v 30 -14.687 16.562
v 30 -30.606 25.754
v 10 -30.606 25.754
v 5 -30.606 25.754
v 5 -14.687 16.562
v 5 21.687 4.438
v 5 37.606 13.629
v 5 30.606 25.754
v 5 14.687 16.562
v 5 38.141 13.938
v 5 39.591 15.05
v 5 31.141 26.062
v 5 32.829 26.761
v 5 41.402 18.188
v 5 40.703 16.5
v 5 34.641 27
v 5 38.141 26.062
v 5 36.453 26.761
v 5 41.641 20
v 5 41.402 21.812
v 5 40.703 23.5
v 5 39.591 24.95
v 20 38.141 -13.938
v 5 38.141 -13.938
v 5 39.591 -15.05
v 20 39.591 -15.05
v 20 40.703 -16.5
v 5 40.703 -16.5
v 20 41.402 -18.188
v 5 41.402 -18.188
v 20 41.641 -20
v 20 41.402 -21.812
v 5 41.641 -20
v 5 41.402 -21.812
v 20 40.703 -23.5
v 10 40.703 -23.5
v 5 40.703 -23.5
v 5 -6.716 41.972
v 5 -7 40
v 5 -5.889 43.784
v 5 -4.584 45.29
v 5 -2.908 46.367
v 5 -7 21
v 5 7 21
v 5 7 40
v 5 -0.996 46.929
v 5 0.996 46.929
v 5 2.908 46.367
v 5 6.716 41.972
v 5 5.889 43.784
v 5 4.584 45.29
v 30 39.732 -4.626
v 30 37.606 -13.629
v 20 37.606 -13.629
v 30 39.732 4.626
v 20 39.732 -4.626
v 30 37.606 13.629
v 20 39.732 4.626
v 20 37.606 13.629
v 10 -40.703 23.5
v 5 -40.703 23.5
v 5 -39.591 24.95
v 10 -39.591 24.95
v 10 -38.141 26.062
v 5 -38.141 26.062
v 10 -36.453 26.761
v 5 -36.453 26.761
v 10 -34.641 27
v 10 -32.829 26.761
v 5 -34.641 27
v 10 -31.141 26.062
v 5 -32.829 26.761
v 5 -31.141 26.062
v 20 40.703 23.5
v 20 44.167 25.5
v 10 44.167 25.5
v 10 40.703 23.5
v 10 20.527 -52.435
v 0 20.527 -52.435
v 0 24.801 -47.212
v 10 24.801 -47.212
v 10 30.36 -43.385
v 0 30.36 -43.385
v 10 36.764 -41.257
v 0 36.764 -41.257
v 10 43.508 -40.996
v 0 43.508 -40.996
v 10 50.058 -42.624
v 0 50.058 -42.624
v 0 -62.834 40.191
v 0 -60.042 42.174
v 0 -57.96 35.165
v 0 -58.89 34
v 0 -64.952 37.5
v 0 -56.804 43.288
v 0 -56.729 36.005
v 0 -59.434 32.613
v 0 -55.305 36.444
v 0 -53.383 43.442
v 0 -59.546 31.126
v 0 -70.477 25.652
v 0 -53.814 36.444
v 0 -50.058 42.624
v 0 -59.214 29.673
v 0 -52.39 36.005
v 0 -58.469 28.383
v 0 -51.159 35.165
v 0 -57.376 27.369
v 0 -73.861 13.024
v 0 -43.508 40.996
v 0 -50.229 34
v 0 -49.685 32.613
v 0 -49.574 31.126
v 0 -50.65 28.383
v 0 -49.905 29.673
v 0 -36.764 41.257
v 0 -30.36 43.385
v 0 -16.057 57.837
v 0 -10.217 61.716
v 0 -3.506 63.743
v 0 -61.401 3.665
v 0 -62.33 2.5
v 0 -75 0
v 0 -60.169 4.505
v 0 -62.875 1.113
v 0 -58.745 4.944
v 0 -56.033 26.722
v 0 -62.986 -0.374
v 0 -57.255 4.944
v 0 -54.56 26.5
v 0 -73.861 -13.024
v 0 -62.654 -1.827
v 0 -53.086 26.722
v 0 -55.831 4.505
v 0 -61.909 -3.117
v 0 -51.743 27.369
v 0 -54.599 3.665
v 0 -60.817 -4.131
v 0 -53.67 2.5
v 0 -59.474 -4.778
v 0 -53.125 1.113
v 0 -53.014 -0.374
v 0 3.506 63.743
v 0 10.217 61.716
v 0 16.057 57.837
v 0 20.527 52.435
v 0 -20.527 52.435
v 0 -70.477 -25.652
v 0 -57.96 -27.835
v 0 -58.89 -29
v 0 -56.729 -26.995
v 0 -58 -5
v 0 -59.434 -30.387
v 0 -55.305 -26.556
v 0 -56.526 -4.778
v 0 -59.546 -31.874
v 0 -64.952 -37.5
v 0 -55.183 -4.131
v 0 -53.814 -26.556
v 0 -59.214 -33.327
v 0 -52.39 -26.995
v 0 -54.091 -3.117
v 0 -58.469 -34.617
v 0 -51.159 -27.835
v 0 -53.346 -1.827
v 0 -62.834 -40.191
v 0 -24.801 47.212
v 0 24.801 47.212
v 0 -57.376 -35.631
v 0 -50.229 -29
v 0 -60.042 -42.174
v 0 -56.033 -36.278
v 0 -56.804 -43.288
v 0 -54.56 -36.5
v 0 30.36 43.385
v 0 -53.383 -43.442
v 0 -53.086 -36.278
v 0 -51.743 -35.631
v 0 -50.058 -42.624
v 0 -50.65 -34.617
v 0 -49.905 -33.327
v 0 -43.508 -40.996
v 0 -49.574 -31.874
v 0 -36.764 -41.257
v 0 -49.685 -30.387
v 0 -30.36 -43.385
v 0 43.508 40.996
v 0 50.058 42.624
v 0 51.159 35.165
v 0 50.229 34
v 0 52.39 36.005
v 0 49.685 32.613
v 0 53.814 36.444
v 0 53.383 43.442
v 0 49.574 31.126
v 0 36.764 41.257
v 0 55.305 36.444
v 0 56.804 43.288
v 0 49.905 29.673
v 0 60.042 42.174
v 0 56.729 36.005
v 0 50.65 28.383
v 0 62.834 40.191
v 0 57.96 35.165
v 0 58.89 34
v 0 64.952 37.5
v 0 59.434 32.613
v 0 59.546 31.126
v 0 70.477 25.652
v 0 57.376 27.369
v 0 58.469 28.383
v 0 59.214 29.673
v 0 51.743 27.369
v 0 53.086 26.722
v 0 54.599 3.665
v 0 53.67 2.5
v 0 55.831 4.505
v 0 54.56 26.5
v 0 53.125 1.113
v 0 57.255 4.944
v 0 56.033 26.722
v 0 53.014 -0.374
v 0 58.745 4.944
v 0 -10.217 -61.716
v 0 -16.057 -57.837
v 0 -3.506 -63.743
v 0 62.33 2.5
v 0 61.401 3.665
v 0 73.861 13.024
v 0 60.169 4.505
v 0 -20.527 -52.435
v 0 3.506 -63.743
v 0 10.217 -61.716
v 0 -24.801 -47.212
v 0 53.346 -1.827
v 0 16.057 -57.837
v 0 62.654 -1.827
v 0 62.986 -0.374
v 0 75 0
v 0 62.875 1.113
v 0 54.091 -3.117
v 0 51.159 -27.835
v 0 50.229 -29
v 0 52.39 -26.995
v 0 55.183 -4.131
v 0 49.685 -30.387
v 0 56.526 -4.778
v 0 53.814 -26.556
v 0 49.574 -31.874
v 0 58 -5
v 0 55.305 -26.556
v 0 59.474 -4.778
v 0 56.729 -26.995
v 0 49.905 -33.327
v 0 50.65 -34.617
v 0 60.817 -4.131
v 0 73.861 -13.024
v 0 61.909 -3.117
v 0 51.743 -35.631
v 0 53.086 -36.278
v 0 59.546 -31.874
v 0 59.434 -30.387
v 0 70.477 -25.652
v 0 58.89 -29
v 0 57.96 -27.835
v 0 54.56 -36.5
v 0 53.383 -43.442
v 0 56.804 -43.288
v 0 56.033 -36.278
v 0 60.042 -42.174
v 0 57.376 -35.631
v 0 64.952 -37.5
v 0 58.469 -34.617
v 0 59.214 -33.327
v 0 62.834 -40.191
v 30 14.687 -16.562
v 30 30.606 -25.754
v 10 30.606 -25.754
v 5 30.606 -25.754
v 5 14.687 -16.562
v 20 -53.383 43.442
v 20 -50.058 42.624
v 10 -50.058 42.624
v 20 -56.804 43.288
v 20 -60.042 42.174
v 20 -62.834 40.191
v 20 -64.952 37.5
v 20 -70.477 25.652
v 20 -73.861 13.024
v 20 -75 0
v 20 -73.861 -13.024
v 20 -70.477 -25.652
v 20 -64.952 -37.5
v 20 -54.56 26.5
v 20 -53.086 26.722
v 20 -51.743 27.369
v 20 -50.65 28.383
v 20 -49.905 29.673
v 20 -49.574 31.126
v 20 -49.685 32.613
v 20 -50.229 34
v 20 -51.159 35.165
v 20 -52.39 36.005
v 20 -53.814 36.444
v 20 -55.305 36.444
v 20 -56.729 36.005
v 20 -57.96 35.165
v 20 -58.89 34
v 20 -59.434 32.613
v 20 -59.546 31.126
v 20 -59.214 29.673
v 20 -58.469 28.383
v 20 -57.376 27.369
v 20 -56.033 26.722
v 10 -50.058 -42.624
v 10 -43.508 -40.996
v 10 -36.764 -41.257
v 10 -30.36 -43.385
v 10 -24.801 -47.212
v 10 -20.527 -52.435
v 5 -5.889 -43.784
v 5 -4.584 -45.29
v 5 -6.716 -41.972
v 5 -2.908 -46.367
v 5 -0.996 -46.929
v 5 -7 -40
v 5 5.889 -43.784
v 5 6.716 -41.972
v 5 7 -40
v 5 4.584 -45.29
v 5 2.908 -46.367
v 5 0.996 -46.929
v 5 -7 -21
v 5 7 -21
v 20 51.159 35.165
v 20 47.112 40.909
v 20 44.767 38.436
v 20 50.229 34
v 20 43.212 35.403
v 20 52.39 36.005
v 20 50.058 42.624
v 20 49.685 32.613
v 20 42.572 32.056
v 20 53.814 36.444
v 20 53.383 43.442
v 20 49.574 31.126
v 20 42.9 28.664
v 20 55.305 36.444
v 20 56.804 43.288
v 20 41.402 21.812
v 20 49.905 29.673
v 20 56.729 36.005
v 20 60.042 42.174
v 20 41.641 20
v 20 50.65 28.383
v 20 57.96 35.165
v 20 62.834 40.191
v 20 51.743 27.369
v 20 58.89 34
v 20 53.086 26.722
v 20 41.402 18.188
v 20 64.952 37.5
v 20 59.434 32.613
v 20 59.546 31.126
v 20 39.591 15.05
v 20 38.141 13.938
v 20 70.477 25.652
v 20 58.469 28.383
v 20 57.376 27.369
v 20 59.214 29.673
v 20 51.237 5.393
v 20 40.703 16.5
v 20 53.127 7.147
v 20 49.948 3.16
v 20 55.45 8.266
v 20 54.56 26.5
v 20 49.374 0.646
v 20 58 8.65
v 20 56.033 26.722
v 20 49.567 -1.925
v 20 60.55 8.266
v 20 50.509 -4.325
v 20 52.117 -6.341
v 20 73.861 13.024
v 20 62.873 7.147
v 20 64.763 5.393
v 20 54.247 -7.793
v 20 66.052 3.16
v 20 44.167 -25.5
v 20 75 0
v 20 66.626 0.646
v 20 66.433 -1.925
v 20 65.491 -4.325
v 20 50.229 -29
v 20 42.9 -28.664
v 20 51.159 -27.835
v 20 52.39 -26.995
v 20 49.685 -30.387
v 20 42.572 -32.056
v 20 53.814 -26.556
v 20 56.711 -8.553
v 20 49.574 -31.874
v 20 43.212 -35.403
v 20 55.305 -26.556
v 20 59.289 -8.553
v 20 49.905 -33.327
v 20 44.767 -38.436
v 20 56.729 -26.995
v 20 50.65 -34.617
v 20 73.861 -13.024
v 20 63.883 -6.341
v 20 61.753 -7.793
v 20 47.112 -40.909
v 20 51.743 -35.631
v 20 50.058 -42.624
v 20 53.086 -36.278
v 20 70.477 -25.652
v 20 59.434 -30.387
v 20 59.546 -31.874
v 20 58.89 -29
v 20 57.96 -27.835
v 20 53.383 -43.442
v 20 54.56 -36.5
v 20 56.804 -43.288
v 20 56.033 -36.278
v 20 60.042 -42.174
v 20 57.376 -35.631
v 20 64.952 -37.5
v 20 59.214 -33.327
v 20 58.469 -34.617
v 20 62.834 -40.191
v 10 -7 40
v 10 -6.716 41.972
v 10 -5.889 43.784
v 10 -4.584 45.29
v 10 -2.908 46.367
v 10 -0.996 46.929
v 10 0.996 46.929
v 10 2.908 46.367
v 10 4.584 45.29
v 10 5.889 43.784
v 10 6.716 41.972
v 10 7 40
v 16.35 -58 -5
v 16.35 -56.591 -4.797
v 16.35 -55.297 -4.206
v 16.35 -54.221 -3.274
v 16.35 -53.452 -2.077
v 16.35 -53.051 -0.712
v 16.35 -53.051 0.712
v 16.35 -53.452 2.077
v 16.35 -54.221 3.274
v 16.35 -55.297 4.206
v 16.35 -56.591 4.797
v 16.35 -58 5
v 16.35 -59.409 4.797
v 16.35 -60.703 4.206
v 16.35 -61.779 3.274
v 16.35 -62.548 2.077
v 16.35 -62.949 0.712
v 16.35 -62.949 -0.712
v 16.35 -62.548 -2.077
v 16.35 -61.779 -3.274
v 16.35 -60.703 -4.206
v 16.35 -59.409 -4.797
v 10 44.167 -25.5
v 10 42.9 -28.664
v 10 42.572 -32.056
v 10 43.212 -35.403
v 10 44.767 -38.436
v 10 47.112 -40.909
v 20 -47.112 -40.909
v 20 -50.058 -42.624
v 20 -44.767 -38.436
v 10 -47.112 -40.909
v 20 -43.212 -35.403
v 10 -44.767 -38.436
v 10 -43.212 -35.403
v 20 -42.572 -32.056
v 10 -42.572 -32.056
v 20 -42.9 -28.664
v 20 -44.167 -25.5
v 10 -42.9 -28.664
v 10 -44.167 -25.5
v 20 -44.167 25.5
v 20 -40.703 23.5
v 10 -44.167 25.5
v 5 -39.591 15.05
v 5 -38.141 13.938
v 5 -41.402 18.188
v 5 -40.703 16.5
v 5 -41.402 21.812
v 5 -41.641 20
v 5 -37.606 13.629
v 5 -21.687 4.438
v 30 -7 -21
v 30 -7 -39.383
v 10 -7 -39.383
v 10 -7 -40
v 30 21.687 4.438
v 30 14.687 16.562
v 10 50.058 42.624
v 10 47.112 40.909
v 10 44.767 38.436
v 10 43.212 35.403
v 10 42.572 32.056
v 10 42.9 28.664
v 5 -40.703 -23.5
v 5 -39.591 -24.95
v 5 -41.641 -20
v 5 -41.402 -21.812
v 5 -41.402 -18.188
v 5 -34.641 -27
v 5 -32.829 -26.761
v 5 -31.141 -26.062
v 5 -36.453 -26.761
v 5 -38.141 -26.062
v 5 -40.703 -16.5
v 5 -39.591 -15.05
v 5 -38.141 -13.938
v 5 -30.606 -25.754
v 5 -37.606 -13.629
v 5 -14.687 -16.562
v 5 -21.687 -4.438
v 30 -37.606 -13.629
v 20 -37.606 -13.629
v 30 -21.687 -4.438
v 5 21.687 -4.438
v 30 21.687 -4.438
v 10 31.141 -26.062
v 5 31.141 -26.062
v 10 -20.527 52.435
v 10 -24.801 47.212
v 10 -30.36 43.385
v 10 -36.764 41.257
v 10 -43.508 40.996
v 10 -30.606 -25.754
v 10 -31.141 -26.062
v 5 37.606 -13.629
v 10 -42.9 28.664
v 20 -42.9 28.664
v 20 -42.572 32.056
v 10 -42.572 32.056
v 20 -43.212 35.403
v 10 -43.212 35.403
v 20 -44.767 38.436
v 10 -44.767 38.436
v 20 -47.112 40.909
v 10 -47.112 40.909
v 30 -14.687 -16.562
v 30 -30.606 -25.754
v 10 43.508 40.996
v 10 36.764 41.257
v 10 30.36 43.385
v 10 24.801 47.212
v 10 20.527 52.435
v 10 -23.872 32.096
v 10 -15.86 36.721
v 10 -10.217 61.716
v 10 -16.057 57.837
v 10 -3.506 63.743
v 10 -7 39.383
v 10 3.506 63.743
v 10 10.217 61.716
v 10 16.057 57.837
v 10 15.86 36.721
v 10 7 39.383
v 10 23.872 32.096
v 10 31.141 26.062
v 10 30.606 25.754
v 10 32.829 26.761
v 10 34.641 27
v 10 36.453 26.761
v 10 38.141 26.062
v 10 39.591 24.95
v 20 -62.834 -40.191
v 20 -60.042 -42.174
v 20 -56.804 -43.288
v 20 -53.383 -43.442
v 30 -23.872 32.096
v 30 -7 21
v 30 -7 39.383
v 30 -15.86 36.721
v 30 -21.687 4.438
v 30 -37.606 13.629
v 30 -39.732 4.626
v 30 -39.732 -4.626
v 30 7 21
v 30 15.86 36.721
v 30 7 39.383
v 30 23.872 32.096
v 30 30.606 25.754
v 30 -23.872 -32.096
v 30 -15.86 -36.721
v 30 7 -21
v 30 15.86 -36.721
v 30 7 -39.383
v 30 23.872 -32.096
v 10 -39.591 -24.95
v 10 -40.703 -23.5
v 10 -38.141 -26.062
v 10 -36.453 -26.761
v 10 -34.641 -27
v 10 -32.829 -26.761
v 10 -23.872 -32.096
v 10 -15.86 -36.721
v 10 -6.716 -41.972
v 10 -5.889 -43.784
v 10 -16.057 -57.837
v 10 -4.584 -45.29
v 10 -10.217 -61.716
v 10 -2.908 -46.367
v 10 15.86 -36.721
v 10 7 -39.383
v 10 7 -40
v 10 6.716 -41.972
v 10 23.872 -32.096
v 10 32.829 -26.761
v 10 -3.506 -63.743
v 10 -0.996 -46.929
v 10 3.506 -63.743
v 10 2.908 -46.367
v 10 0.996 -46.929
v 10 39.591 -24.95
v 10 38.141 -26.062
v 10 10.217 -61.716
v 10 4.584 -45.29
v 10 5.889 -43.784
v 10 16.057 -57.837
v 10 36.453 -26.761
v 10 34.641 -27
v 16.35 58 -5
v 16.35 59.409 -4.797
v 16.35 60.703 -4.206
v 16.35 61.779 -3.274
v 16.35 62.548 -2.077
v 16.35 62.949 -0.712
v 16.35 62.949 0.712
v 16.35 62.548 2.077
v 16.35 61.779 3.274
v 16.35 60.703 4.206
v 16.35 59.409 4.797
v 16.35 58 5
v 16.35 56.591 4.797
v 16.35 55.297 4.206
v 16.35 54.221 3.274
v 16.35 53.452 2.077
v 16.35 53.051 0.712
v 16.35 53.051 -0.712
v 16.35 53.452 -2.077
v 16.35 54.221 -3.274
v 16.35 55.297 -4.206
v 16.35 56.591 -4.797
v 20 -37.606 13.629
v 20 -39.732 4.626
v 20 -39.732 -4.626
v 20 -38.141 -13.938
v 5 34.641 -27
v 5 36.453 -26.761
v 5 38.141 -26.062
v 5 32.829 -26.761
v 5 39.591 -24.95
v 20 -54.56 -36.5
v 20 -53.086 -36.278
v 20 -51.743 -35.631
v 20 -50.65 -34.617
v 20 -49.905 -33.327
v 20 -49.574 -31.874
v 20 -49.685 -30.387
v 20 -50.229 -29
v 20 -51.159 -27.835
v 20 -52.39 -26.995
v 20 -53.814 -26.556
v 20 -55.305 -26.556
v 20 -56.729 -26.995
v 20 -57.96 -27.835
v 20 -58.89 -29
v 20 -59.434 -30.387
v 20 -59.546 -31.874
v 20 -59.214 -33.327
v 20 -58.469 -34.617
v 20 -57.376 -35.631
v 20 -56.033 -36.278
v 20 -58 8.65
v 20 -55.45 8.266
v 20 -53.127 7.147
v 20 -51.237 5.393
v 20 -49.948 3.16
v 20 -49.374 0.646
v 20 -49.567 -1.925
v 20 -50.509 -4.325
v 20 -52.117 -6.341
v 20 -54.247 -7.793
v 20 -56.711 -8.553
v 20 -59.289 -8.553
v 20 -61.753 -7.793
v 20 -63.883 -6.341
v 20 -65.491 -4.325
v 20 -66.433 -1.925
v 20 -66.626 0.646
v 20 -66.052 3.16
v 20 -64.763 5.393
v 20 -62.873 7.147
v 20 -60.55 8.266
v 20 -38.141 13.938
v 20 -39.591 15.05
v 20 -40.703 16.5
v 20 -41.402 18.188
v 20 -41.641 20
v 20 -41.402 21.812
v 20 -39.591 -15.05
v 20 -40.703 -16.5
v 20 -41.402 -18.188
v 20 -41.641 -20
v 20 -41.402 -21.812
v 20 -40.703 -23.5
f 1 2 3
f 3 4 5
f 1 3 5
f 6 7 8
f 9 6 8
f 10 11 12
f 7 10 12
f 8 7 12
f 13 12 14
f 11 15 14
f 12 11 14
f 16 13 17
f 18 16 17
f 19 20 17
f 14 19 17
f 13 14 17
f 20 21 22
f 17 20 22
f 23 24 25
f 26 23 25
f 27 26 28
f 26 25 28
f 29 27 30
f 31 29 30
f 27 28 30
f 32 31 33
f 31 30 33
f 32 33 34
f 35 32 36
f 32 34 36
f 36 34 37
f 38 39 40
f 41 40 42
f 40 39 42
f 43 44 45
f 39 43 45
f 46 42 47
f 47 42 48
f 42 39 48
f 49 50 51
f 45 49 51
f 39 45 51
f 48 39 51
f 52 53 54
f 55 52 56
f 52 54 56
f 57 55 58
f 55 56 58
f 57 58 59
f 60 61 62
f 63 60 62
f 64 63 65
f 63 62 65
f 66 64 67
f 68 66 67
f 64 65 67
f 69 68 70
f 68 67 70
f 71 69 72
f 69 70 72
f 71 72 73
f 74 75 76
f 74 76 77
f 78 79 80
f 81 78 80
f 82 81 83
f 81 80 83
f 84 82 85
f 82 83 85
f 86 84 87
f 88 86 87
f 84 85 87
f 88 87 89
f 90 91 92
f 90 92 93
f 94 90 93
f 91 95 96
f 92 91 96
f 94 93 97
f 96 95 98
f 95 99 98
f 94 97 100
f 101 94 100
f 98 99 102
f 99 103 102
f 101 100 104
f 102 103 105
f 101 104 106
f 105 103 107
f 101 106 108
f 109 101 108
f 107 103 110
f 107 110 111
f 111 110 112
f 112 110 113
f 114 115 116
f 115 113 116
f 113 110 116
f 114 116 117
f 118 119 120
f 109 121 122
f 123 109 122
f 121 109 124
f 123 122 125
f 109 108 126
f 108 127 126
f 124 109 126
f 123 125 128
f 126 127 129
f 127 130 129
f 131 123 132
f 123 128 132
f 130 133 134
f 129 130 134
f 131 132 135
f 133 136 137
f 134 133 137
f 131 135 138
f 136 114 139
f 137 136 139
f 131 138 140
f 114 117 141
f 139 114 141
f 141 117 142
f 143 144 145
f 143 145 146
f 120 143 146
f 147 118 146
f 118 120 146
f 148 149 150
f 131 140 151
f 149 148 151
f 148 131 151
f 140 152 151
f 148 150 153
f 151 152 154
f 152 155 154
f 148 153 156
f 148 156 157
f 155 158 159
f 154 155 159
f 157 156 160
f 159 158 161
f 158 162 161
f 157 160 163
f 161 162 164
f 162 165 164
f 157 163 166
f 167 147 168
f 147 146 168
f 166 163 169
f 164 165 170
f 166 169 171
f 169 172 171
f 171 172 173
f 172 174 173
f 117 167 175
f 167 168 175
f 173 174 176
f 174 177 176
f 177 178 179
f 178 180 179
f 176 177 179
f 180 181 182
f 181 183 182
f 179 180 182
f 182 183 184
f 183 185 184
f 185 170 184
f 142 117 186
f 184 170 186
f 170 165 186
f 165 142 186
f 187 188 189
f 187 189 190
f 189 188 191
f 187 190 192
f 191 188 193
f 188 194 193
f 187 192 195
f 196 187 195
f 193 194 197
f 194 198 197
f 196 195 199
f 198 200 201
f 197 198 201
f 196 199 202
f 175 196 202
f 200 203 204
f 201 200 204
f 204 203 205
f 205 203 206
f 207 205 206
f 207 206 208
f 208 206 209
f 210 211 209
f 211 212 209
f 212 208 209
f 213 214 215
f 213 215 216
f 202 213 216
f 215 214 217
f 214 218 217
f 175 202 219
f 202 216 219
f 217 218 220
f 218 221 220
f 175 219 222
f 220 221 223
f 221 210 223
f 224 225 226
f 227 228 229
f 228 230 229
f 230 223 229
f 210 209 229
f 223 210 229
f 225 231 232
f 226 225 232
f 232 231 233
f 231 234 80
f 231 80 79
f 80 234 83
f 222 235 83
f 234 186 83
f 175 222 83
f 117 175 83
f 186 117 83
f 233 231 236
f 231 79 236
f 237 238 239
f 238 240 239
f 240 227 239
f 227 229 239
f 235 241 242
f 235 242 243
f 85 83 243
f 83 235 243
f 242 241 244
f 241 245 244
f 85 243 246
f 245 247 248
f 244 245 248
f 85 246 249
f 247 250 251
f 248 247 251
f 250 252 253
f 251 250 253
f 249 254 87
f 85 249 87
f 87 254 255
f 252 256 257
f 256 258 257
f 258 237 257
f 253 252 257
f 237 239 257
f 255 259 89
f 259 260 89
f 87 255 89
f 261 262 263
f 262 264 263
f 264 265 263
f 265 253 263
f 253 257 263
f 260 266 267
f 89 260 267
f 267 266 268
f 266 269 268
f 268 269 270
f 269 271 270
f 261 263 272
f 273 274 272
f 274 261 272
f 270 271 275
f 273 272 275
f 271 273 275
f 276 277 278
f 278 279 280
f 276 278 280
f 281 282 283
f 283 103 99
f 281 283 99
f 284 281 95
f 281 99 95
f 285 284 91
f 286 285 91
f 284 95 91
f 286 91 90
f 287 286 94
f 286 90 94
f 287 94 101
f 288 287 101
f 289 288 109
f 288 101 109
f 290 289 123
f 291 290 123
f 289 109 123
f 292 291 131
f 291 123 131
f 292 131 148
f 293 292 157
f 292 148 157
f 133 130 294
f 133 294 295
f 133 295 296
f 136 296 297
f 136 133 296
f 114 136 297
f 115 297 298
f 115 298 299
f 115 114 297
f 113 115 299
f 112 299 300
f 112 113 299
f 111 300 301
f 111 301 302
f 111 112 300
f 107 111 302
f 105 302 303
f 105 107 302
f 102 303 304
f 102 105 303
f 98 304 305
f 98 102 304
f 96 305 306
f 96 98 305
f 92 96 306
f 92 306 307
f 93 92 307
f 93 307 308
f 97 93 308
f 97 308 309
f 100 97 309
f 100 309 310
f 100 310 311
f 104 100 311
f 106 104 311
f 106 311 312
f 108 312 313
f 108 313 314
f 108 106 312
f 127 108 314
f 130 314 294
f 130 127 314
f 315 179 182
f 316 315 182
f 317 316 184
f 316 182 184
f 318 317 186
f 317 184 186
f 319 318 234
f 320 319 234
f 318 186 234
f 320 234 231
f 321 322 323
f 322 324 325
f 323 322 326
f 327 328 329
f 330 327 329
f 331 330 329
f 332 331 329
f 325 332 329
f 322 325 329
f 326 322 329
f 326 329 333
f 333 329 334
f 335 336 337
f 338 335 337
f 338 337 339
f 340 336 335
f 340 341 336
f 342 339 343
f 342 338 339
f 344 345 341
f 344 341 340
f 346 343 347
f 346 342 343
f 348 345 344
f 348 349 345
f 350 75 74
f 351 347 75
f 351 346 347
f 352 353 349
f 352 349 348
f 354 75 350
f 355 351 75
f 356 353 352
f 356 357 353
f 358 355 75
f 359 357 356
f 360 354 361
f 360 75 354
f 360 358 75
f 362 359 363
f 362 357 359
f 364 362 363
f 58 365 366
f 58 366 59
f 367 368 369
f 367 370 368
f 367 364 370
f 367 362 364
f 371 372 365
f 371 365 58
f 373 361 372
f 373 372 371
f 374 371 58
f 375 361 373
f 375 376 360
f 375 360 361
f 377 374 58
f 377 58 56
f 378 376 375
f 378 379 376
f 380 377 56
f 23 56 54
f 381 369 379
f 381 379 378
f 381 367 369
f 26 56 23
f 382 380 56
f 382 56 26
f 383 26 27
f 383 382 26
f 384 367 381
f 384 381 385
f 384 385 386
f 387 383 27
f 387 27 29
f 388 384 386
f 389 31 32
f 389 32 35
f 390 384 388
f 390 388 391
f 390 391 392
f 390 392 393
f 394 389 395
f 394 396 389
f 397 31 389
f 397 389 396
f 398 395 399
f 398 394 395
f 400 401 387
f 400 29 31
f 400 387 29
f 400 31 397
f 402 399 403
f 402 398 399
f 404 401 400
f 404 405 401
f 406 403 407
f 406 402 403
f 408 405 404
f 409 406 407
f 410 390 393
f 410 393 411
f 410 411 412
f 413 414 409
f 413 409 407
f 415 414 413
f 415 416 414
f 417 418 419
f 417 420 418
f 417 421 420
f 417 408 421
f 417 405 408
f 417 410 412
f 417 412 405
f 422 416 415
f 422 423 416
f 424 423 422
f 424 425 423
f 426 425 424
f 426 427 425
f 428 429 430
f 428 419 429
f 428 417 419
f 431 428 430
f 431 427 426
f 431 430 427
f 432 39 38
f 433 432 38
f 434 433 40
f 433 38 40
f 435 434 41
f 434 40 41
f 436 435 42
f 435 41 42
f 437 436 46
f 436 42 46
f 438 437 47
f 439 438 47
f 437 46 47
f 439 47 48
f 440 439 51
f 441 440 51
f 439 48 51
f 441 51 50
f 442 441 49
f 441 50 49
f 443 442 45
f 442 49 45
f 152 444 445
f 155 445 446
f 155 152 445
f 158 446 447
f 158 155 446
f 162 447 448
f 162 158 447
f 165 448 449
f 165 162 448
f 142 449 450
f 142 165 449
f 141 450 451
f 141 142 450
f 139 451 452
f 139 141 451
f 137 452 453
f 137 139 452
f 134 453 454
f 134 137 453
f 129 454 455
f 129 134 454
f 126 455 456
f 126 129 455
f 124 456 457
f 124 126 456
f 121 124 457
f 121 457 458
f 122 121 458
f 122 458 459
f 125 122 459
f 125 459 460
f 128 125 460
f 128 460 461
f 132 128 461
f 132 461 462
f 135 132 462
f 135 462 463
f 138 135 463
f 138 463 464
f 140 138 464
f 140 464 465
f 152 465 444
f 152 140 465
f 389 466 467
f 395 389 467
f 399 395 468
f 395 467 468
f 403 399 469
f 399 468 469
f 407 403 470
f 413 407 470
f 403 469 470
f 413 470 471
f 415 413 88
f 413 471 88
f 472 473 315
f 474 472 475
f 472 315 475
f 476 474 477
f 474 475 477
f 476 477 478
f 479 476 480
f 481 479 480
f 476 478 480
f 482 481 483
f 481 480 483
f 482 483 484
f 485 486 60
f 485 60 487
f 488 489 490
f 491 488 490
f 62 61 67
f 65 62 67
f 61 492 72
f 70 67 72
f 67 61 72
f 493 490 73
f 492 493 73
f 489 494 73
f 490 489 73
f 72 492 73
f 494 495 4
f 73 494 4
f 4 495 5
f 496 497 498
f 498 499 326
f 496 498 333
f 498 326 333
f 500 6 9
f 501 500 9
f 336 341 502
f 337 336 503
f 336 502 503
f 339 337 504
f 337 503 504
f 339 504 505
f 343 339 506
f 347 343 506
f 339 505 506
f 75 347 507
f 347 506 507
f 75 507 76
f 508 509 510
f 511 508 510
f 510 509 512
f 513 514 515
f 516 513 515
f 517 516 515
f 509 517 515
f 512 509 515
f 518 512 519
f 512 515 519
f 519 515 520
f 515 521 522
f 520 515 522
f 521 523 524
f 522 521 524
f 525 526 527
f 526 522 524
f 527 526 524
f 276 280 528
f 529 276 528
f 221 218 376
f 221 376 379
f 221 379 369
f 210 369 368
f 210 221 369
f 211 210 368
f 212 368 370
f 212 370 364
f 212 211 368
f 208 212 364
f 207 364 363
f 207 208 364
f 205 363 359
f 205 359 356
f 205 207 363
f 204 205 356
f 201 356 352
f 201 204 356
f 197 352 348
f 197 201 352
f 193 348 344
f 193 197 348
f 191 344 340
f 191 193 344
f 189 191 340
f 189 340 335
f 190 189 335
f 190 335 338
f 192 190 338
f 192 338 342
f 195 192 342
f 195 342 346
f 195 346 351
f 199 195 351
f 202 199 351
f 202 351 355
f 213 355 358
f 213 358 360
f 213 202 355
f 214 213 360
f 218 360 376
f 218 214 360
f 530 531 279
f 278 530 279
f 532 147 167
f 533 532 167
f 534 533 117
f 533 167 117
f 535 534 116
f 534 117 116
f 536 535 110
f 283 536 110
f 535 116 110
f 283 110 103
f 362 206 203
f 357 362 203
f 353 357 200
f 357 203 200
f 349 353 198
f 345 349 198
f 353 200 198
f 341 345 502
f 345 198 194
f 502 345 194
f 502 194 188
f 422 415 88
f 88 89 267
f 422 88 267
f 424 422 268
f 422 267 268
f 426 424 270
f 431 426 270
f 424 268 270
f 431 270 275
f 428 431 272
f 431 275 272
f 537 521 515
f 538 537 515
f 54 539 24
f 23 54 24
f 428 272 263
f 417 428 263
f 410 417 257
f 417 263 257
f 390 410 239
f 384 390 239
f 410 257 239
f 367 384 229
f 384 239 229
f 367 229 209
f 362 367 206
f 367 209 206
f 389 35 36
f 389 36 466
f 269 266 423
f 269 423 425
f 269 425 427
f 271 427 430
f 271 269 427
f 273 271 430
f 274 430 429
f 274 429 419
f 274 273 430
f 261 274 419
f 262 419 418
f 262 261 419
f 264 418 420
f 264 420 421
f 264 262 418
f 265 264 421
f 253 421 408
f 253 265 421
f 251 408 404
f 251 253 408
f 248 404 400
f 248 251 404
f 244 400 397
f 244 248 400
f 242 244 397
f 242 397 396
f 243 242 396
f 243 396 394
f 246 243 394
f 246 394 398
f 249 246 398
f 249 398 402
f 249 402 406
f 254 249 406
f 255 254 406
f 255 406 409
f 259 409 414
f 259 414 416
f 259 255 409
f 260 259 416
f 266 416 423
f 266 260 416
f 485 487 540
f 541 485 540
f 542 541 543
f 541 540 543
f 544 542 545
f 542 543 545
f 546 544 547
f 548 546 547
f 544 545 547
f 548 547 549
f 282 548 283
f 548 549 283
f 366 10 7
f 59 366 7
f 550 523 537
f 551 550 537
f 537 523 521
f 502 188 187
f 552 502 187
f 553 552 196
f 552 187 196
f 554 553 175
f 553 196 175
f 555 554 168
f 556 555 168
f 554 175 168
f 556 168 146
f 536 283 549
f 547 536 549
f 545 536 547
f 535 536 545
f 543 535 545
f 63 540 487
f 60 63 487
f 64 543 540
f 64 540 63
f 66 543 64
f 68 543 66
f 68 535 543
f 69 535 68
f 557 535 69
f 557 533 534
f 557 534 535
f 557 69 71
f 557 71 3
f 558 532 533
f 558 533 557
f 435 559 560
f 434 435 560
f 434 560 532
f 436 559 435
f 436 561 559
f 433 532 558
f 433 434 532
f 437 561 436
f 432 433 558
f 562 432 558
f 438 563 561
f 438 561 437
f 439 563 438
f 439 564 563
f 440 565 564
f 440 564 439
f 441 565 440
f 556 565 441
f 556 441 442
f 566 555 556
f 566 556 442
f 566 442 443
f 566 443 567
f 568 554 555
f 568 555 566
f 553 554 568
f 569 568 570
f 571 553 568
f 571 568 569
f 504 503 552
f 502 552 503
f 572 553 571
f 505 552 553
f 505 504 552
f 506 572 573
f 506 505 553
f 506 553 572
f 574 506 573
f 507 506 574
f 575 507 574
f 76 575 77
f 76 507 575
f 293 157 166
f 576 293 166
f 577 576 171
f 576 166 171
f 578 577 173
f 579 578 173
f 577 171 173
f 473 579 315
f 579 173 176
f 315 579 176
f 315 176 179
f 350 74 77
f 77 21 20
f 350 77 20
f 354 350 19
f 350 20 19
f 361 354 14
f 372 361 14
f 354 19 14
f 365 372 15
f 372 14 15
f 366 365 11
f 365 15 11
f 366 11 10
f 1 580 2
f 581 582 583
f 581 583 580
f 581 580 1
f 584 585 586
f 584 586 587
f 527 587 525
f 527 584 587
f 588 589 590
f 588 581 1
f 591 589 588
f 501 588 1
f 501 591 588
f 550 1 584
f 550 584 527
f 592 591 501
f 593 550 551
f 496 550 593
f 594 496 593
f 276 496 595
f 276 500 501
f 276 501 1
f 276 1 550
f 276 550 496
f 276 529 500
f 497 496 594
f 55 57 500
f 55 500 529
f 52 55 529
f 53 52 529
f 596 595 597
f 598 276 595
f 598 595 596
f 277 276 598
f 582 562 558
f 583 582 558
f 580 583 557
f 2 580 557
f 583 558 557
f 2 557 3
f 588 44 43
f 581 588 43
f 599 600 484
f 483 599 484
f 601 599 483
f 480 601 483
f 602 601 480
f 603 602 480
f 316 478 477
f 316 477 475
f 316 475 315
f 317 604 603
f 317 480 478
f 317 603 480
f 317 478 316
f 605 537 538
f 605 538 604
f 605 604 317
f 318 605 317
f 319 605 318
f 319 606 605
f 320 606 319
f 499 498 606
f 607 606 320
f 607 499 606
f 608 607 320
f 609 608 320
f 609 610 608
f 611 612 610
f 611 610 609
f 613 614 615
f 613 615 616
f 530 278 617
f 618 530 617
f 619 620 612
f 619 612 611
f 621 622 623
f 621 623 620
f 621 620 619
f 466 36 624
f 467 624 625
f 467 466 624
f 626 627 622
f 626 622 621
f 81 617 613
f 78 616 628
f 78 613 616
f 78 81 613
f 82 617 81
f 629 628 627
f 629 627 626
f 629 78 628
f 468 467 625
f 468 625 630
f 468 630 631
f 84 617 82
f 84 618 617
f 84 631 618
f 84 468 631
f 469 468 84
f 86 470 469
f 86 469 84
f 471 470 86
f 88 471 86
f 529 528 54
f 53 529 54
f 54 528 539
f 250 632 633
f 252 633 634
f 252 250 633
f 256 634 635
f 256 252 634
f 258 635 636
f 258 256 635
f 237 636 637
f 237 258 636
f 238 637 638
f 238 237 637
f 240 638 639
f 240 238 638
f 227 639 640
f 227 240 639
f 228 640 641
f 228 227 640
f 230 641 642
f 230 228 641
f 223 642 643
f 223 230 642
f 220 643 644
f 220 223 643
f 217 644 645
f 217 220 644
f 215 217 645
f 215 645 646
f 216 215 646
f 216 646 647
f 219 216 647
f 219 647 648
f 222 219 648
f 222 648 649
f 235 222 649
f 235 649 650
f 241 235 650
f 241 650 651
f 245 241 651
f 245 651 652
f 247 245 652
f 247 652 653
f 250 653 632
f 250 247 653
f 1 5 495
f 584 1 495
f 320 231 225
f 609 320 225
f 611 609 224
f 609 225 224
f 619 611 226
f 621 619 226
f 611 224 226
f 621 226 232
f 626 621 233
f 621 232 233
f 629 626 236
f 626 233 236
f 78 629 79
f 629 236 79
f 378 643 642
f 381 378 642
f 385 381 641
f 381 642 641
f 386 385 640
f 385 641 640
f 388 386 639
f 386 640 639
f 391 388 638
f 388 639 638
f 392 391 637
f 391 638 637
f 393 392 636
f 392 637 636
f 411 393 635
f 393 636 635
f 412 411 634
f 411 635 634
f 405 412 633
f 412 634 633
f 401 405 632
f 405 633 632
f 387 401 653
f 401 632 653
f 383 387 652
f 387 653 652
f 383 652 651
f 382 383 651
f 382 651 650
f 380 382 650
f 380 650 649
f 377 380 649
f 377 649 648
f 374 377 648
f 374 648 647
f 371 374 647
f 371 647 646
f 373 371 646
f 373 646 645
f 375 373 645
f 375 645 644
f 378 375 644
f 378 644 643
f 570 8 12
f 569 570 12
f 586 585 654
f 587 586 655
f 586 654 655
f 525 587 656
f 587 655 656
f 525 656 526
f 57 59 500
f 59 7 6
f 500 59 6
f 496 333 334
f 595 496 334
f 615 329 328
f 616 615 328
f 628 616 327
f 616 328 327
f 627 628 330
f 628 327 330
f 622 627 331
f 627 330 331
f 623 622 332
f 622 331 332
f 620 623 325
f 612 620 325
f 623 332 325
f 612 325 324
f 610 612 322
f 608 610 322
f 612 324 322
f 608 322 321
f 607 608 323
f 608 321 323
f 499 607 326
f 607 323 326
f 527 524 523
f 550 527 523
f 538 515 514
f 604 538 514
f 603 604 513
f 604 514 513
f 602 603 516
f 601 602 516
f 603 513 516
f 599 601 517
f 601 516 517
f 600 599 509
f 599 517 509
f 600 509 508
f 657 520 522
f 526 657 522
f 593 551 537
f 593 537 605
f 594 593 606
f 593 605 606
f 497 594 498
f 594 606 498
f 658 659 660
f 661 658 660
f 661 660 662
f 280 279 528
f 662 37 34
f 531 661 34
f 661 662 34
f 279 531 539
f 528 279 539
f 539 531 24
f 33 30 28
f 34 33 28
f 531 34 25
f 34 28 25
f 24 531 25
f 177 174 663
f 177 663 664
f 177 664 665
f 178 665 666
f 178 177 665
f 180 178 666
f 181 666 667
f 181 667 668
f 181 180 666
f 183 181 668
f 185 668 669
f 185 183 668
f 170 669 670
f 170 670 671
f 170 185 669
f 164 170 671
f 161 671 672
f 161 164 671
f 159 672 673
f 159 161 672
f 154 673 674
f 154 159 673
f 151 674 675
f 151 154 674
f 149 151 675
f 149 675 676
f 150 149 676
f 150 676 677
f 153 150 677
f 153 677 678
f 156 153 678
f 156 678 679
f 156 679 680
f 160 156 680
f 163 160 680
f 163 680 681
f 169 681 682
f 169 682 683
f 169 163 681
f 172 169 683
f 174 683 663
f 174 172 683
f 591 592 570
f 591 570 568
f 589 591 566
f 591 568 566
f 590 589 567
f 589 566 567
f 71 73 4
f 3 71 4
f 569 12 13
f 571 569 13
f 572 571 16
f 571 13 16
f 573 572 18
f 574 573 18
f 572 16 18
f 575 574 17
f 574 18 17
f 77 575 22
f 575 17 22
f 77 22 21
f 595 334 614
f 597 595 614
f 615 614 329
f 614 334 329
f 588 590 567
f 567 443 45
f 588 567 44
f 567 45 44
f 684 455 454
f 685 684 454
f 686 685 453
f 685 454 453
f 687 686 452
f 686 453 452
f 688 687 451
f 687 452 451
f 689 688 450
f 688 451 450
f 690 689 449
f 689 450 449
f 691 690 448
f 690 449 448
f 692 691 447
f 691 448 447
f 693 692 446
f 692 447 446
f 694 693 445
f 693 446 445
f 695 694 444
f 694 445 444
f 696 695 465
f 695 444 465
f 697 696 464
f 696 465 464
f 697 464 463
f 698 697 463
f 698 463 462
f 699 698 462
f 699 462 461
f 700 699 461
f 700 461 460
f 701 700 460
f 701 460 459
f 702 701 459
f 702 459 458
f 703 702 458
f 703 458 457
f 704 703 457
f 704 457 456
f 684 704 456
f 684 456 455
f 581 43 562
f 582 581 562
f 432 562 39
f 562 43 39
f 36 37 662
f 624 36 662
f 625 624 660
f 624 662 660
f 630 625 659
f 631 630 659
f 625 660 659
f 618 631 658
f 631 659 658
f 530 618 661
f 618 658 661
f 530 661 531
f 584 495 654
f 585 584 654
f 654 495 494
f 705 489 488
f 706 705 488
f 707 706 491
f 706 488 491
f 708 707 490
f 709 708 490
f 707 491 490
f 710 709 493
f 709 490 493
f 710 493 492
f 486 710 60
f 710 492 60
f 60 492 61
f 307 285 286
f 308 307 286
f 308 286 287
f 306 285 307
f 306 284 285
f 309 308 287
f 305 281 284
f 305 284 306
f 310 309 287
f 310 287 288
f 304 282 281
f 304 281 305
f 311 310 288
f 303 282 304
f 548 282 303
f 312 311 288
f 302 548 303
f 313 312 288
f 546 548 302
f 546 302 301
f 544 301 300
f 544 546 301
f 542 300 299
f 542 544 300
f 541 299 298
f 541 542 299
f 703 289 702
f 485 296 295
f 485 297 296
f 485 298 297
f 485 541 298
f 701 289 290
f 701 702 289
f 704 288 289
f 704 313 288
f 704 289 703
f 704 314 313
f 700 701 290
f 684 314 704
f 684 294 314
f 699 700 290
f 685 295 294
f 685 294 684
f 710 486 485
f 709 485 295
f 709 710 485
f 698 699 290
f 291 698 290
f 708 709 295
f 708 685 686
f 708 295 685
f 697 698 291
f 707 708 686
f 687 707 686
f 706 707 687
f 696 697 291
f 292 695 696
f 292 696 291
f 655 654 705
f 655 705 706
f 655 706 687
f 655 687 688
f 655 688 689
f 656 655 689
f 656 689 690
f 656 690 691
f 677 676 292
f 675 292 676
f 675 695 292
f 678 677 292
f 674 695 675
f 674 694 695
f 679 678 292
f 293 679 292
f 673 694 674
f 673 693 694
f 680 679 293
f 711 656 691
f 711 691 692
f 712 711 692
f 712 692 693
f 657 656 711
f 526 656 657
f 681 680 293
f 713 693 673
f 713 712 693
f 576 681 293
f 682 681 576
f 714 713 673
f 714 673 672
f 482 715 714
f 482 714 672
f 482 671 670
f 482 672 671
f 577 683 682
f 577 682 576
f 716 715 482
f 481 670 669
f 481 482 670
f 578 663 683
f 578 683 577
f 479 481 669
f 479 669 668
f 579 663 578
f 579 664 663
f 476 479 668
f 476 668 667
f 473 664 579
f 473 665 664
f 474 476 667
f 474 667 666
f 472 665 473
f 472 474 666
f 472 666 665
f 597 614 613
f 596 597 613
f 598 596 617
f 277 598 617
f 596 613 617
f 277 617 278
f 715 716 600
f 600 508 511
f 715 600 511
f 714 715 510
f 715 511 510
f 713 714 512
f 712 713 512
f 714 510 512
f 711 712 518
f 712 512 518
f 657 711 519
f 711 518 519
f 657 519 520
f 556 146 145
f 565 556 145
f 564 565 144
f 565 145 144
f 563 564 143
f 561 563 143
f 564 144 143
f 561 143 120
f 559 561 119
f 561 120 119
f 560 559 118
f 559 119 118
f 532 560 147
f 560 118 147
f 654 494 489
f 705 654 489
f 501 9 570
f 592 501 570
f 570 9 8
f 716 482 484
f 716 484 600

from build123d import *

# Parameters (mm, degrees)
BOSS_EXTRUDE1_DEPTH                             = 10
BOSS_EXTRUDE1_2_DEPTH                           = 10
BOSS_EXTRUDE2_DEPTH                             = 30
BOSS_EXTRUDE3_DEPTH                             = 5
SKETCH1_5_R                                     = 5
BOSS_EXTRUDE4_DEPTH                             = 20
CSK_FOR_M8_FLAT_HEAD_MACHINE_SCREW1_D           = 10
CSK_FOR_M8_FLAT_HEAD_MACHINE_SCREW1_CSINK_D     = 17.3
CSK_FOR_M8_FLAT_HEAD_MACHINE_SCREW1_CSINK_ANGLE = 90


with BuildPart() as part:
    # Sketch1 → Boss-Extrude1 (new body)
    with BuildSketch(Plane(origin=(0, 0, 0), x_dir=(0, 0, -1), z_dir=(1, 0, 0))):
        with BuildLine():
            ThreePointArc((25.753546494, 30.606451003), (34.641016151, 20), (39.382737335, 7))
            Line((39.382737335, 7), (40, 7))
            ThreePointArc((40, 7), (47, 0), (40, -7))
            Line((40, -7), (39.382737335, -7))
            ThreePointArc((39.382737335, -7), (34.641016151, -20), (25.753546494, -30.606451003))
            Line((25.753546494, -30.606451003), (26.062177826, -31.141016151))
            ThreePointArc((26.062177826, -31.141016151), (26.761480784, -36.452749467), (23.5, -40.703193978))
            Line((23.5, -40.703193978), (25.5, -44.167295593))
            ThreePointArc((25.5, -44.167295593), (35.403493203, -43.212233307), (42.62357008, -50.057802056))
            ThreePointArc((42.62357008, -50.057802056), (42.094968285, -33.486802939), (52.43535512, -20.527102646))
            ThreePointArc((52.43535512, -20.527102646), (64, 0), (52.43535512, 20.527102646))
            ThreePointArc((52.43535512, 20.527102646), (42.094968285, 33.486802939), (42.62357008, 50.057802056))
            ThreePointArc((42.62357008, 50.057802056), (35.403493203, 43.212233307), (25.5, 44.167295593))
            Line((25.5, 44.167295593), (23.5, 40.703193978))
            ThreePointArc((23.5, 40.703193978), (26.761480784, 36.452749467), (26.062177826, 31.141016151))
            Line((26.062177826, 31.141016151), (25.753546494, 30.606451003))
        make_face()
    extrude(amount=BOSS_EXTRUDE1_DEPTH)



with BuildPart() as body_2:
    # Sketch1 → Boss-Extrude1 2 (new body)
    with BuildSketch(Plane(origin=(0, 0, 0), x_dir=(0, 0, -1), z_dir=(1, 0, 0))):
        with BuildLine():
            ThreePointArc((-26.062177826, 31.141016151), (-26.761480784, 36.452749467), (-23.5, 40.703193978))
            Line((-23.5, 40.703193978), (-25.5, 44.167295593))
            ThreePointArc((-25.5, 44.167295593), (-35.403493203, 43.212233307), (-42.62357008, 50.057802056))
            ThreePointArc((-42.62357008, 50.057802056), (-42.094968285, 33.486802939), (-52.43535512, 20.527102646))
            ThreePointArc((-52.43535512, 20.527102646), (-64, 0), (-52.43535512, -20.527102646))
            ThreePointArc((-52.43535512, -20.527102646), (-42.094968285, -33.486802939), (-42.62357008, -50.057802056))
            ThreePointArc((-42.62357008, -50.057802056), (-35.403493203, -43.212233307), (-25.5, -44.167295593))
            Line((-25.5, -44.167295593), (-23.5, -40.703193978))
            ThreePointArc((-23.5, -40.703193978), (-26.761480784, -36.452749467), (-26.062177826, -31.141016151))
            Line((-26.062177826, -31.141016151), (-25.753546494, -30.606451003))
            ThreePointArc((-25.753546494, -30.606451003), (-34.641016151, -20), (-39.382737335, -7))
            Line((-39.382737335, -7), (-40, -7))
            ThreePointArc((-40, -7), (-47, 0), (-40, 7))
            Line((-40, 7), (-39.382737335, 7))
            ThreePointArc((-39.382737335, 7), (-34.641016151, 20), (-25.753546494, 30.606451003))
            Line((-25.753546494, 30.606451003), (-26.062177826, 31.141016151))
        make_face()
    extrude(amount=BOSS_EXTRUDE1_2_DEPTH)


with BuildPart() as part_1:
    add(part.part)

    add(body_2.part)  # Boss-Extrude2 merges body 2
    # Sketch1<3> → Boss-Extrude2 (add)
    with BuildSketch(Plane(origin=(0, 0, 0), x_dir=(0, 0, -1), z_dir=(1, 0, 0))):
        with BuildLine():
            Line((21, -7), (21, 7))
            Line((21, 7), (39.382737335, 7))
            ThreePointArc((39.382737335, 7), (34.641016151, 20), (25.753546494, 30.606451003))
            Line((25.753546494, 30.606451003), (16.562177826, 14.686533479))
            Line((16.562177826, 14.686533479), (4.437822174, 21.686533479))
            Line((4.437822174, 21.686533479), (13.629190841, 37.606451003))
            ThreePointArc((13.629190841, 37.606451003), (0, 40), (-13.629190841, 37.606451003))
            Line((-13.629190841, 37.606451003), (-4.437822174, 21.686533479))
            Line((-4.437822174, 21.686533479), (-16.562177826, 14.686533479))
            Line((-16.562177826, 14.686533479), (-25.753546494, 30.606451003))
            ThreePointArc((-25.753546494, 30.606451003), (-34.641016151, 20), (-39.382737335, 7))
            Line((-39.382737335, 7), (-21, 7))
            Line((-21, 7), (-21, -7))
            Line((-21, -7), (-39.382737335, -7))
            ThreePointArc((-39.382737335, -7), (-34.641016151, -20), (-25.753546494, -30.606451003))
            Line((-25.753546494, -30.606451003), (-16.562177826, -14.686533479))
            Line((-16.562177826, -14.686533479), (-4.437822174, -21.686533479))
            Line((-4.437822174, -21.686533479), (-13.629190841, -37.606451003))
            ThreePointArc((-13.629190841, -37.606451003), (0, -40), (13.629190841, -37.606451003))
            Line((13.629190841, -37.606451003), (4.437822174, -21.686533479))
            Line((4.437822174, -21.686533479), (16.562177826, -14.686533479))
            Line((16.562177826, -14.686533479), (25.753546494, -30.606451003))
            ThreePointArc((25.753546494, -30.606451003), (34.641016151, -20), (39.382737335, -7))
            Line((39.382737335, -7), (21, -7))
        make_face()
    extrude(amount=BOSS_EXTRUDE2_DEPTH)

    # Sketch1<4> → Boss-Extrude3 (add)
    with BuildSketch(Plane(origin=(0, 0, 0), x_dir=(0, 0, -1), z_dir=(1, 0, 0))):
        with BuildLine():
            Line((40, 7), (21, 7))
            Line((21, 7), (21, -7))
            Line((21, -7), (40, -7))
            ThreePointArc((40, -7), (47, 0), (40, 7))
        make_face()
        with BuildLine():
            Line((16.562177826, 14.686533479), (26.062177826, 31.141016151))
            ThreePointArc((26.062177826, 31.141016151), (23.5, 40.703193978), (13.937822174, 38.141016151))
            Line((13.937822174, 38.141016151), (4.437822174, 21.686533479))
            Line((4.437822174, 21.686533479), (16.562177826, 14.686533479))
        make_face()
        with BuildLine():
            Line((26.062177826, -31.141016151), (16.562177826, -14.686533479))
            Line((16.562177826, -14.686533479), (4.437822174, -21.686533479))
            Line((4.437822174, -21.686533479), (13.937822174, -38.141016151))
            ThreePointArc((13.937822174, -38.141016151), (23.5, -40.703193978), (26.062177826, -31.141016151))
        make_face()
        with BuildLine():
            Line((-4.437822174, 21.686533479), (-13.937822174, 38.141016151))
            ThreePointArc((-13.937822174, 38.141016151), (-23.5, 40.703193978), (-26.062177826, 31.141016151))
            Line((-26.062177826, 31.141016151), (-16.562177826, 14.686533479))
            Line((-16.562177826, 14.686533479), (-4.437822174, 21.686533479))
        make_face()
        with BuildLine():
            Line((-13.937822174, -38.141016151), (-4.437822174, -21.686533479))
            Line((-4.437822174, -21.686533479), (-16.562177826, -14.686533479))
            Line((-16.562177826, -14.686533479), (-26.062177826, -31.141016151))
            ThreePointArc((-26.062177826, -31.141016151), (-23.5, -40.703193978), (-13.937822174, -38.141016151))
        make_face()
        with BuildLine():
            Line((-21, 7), (-40, 7))
            ThreePointArc((-40, 7), (-47, 0), (-40, -7))
            Line((-40, -7), (-21, -7))
            Line((-21, -7), (-21, 7))
        make_face()
    extrude(amount=BOSS_EXTRUDE3_DEPTH)

    # Sketch1<5> → Boss-Extrude4 (add)
    # profile 1 of 2: a face of its own
    with BuildSketch(Plane(origin=(0, 0, 0), x_dir=(0, 0, -1), z_dir=(1, 0, 0))):
        with BuildLine():
            ThreePointArc((13.937822174, 38.141016151), (18.188266684, 41.402496935), (23.5, 40.703193978))
            Line((23.5, 40.703193978), (25.5, 44.167295593))
            ThreePointArc((25.5, 44.167295593), (41.892304845, 48.559600438), (37.5, 64.951905284))
            ThreePointArc((37.5, 64.951905284), (0, 75), (-37.5, 64.951905284))
            ThreePointArc((-37.5, 64.951905284), (-41.892304845, 48.559600438), (-25.5, 44.167295593))
            Line((-25.5, 44.167295593), (-23.5, 40.703193978))
            ThreePointArc((-23.5, 40.703193978), (-18.188266684, 41.402496935), (-13.937822174, 38.141016151))
            Line((-13.937822174, 38.141016151), (-13.629190841, 37.606451003))
            ThreePointArc((-13.629190841, 37.606451003), (0, 40), (13.629190841, 37.606451003))
            Line((13.629190841, 37.606451003), (13.937822174, 38.141016151))
        make_face()
        with Locations((-31.5, 54.559600438)):
            Circle(SKETCH1_5_R, mode=Mode.SUBTRACT)
        with Locations((31.5, 54.559600438)):
            Circle(SKETCH1_5_R, mode=Mode.SUBTRACT)
        with Locations((0, 58)):
            Circle(SKETCH1_5_R, mode=Mode.SUBTRACT)
    # profile 2 of 2: a face of its own
    with BuildSketch(Plane(origin=(0, 0, 0), x_dir=(0, 0, -1), z_dir=(1, 0, 0))):
        with BuildLine():
            Line((25.5, -44.167295593), (23.5, -40.703193978))
            ThreePointArc((23.5, -40.703193978), (18.188266684, -41.402496935), (13.937822174, -38.141016151))
            Line((13.937822174, -38.141016151), (13.629190841, -37.606451003))
            ThreePointArc((13.629190841, -37.606451003), (0, -40), (-13.629190841, -37.606451003))
            Line((-13.629190841, -37.606451003), (-13.937822174, -38.141016151))
            ThreePointArc((-13.937822174, -38.141016151), (-18.188266684, -41.402496935), (-23.5, -40.703193978))
            Line((-23.5, -40.703193978), (-25.5, -44.167295593))
            ThreePointArc((-25.5, -44.167295593), (-41.892304845, -48.559600438), (-37.5, -64.951905284))
            ThreePointArc((-37.5, -64.951905284), (0, -75), (37.5, -64.951905284))
            ThreePointArc((37.5, -64.951905284), (41.892304845, -48.559600438), (25.5, -44.167295593))
        make_face()
        with Locations((-31.5, -54.559600438)):
            Circle(SKETCH1_5_R, mode=Mode.SUBTRACT)
        with Locations((0, -58)):
            Circle(SKETCH1_5_R, mode=Mode.SUBTRACT)
        with Locations((31.5, -54.559600438)):
            Circle(SKETCH1_5_R, mode=Mode.SUBTRACT)
    extrude(amount=BOSS_EXTRUDE4_DEPTH)

    # CSK for M8 Flat Head Machine Screw1 (through all)
    with Locations(Plane(origin=(20, 0, 0), x_dir=(0, 0, -1), z_dir=(1, 0, 0))):
        with Locations((0, 58), (0, -58)):
            CounterSinkHole(CSK_FOR_M8_FLAT_HEAD_MACHINE_SCREW1_D / 2, CSK_FOR_M8_FLAT_HEAD_MACHINE_SCREW1_CSINK_D / 2, counter_sink_angle=CSK_FOR_M8_FLAT_HEAD_MACHINE_SCREW1_CSINK_ANGLE)


solid = part_1.part
